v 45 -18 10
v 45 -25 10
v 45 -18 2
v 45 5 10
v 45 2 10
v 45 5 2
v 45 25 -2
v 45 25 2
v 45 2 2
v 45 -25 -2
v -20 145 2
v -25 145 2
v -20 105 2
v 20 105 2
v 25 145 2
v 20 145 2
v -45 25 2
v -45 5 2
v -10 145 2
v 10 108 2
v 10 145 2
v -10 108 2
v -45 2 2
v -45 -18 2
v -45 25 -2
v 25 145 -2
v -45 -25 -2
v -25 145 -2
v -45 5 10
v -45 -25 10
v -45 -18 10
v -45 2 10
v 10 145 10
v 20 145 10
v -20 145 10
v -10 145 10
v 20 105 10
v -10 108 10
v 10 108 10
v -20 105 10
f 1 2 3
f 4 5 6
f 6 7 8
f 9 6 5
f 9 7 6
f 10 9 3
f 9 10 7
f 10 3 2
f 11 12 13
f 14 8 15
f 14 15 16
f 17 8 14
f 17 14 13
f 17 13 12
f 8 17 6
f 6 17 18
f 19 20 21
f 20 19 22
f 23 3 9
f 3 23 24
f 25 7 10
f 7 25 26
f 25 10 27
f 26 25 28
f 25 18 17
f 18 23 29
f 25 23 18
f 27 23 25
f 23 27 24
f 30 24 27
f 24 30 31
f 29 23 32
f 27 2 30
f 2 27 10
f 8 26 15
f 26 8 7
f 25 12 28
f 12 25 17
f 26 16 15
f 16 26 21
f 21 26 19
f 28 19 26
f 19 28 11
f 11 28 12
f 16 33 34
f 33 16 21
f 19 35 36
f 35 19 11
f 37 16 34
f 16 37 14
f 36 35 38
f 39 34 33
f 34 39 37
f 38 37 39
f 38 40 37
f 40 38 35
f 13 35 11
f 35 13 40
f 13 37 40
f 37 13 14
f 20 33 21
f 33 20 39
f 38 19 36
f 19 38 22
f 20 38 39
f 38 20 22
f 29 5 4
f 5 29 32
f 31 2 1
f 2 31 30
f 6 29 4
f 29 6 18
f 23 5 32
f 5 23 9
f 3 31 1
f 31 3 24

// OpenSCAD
/* [Global] */

/* [Plate] */
plate_thickness = 4.0; //

/* [Booms] */
boom_height = 20.0;
boom_width = 20.0;

main();
module trapezoid(bottom, top, height, z){
	linear_extrude(height = z, center = true, convexity = 10) polygon( points=[[-bottom/2,-height/2],[bottom/2,-height/2],[top/2,height/2],[-top/2,height/2]] );
}

module baseplate() {
	union() {
		cube(size = [90.0, 50.0, plate_thickness], center = true);
		translate([0,85.0,0]) rotate ([0,0,0]) trapezoid(bottom = 90.0, top = 50.0, height = 120.0, z = plate_thickness);
	}
}

module yaw_connector() {
	difference() {
		cube(size = [boom_width + 20.0, 40.0, boom_height/2], center = true);
		translate([0,3.0,0]) cube(size = [boom_width, 40.0, boom_height/2+1], center = true);
	}
}
module t_connector() {
	difference() {
		cube(size = [90.0, boom_width+10.0, boom_height/2], center = true);
		translate([0,2.0,0]) cube(size = [91.0, boom_width, boom_height/2+1], center = true);
	}
}

module main() {
	union() {
		baseplate();
		translate([0,125.0,boom_height/4]) yaw_connector();
		translate([0,-10.0,boom_height/4]) t_connector();
	}
}
